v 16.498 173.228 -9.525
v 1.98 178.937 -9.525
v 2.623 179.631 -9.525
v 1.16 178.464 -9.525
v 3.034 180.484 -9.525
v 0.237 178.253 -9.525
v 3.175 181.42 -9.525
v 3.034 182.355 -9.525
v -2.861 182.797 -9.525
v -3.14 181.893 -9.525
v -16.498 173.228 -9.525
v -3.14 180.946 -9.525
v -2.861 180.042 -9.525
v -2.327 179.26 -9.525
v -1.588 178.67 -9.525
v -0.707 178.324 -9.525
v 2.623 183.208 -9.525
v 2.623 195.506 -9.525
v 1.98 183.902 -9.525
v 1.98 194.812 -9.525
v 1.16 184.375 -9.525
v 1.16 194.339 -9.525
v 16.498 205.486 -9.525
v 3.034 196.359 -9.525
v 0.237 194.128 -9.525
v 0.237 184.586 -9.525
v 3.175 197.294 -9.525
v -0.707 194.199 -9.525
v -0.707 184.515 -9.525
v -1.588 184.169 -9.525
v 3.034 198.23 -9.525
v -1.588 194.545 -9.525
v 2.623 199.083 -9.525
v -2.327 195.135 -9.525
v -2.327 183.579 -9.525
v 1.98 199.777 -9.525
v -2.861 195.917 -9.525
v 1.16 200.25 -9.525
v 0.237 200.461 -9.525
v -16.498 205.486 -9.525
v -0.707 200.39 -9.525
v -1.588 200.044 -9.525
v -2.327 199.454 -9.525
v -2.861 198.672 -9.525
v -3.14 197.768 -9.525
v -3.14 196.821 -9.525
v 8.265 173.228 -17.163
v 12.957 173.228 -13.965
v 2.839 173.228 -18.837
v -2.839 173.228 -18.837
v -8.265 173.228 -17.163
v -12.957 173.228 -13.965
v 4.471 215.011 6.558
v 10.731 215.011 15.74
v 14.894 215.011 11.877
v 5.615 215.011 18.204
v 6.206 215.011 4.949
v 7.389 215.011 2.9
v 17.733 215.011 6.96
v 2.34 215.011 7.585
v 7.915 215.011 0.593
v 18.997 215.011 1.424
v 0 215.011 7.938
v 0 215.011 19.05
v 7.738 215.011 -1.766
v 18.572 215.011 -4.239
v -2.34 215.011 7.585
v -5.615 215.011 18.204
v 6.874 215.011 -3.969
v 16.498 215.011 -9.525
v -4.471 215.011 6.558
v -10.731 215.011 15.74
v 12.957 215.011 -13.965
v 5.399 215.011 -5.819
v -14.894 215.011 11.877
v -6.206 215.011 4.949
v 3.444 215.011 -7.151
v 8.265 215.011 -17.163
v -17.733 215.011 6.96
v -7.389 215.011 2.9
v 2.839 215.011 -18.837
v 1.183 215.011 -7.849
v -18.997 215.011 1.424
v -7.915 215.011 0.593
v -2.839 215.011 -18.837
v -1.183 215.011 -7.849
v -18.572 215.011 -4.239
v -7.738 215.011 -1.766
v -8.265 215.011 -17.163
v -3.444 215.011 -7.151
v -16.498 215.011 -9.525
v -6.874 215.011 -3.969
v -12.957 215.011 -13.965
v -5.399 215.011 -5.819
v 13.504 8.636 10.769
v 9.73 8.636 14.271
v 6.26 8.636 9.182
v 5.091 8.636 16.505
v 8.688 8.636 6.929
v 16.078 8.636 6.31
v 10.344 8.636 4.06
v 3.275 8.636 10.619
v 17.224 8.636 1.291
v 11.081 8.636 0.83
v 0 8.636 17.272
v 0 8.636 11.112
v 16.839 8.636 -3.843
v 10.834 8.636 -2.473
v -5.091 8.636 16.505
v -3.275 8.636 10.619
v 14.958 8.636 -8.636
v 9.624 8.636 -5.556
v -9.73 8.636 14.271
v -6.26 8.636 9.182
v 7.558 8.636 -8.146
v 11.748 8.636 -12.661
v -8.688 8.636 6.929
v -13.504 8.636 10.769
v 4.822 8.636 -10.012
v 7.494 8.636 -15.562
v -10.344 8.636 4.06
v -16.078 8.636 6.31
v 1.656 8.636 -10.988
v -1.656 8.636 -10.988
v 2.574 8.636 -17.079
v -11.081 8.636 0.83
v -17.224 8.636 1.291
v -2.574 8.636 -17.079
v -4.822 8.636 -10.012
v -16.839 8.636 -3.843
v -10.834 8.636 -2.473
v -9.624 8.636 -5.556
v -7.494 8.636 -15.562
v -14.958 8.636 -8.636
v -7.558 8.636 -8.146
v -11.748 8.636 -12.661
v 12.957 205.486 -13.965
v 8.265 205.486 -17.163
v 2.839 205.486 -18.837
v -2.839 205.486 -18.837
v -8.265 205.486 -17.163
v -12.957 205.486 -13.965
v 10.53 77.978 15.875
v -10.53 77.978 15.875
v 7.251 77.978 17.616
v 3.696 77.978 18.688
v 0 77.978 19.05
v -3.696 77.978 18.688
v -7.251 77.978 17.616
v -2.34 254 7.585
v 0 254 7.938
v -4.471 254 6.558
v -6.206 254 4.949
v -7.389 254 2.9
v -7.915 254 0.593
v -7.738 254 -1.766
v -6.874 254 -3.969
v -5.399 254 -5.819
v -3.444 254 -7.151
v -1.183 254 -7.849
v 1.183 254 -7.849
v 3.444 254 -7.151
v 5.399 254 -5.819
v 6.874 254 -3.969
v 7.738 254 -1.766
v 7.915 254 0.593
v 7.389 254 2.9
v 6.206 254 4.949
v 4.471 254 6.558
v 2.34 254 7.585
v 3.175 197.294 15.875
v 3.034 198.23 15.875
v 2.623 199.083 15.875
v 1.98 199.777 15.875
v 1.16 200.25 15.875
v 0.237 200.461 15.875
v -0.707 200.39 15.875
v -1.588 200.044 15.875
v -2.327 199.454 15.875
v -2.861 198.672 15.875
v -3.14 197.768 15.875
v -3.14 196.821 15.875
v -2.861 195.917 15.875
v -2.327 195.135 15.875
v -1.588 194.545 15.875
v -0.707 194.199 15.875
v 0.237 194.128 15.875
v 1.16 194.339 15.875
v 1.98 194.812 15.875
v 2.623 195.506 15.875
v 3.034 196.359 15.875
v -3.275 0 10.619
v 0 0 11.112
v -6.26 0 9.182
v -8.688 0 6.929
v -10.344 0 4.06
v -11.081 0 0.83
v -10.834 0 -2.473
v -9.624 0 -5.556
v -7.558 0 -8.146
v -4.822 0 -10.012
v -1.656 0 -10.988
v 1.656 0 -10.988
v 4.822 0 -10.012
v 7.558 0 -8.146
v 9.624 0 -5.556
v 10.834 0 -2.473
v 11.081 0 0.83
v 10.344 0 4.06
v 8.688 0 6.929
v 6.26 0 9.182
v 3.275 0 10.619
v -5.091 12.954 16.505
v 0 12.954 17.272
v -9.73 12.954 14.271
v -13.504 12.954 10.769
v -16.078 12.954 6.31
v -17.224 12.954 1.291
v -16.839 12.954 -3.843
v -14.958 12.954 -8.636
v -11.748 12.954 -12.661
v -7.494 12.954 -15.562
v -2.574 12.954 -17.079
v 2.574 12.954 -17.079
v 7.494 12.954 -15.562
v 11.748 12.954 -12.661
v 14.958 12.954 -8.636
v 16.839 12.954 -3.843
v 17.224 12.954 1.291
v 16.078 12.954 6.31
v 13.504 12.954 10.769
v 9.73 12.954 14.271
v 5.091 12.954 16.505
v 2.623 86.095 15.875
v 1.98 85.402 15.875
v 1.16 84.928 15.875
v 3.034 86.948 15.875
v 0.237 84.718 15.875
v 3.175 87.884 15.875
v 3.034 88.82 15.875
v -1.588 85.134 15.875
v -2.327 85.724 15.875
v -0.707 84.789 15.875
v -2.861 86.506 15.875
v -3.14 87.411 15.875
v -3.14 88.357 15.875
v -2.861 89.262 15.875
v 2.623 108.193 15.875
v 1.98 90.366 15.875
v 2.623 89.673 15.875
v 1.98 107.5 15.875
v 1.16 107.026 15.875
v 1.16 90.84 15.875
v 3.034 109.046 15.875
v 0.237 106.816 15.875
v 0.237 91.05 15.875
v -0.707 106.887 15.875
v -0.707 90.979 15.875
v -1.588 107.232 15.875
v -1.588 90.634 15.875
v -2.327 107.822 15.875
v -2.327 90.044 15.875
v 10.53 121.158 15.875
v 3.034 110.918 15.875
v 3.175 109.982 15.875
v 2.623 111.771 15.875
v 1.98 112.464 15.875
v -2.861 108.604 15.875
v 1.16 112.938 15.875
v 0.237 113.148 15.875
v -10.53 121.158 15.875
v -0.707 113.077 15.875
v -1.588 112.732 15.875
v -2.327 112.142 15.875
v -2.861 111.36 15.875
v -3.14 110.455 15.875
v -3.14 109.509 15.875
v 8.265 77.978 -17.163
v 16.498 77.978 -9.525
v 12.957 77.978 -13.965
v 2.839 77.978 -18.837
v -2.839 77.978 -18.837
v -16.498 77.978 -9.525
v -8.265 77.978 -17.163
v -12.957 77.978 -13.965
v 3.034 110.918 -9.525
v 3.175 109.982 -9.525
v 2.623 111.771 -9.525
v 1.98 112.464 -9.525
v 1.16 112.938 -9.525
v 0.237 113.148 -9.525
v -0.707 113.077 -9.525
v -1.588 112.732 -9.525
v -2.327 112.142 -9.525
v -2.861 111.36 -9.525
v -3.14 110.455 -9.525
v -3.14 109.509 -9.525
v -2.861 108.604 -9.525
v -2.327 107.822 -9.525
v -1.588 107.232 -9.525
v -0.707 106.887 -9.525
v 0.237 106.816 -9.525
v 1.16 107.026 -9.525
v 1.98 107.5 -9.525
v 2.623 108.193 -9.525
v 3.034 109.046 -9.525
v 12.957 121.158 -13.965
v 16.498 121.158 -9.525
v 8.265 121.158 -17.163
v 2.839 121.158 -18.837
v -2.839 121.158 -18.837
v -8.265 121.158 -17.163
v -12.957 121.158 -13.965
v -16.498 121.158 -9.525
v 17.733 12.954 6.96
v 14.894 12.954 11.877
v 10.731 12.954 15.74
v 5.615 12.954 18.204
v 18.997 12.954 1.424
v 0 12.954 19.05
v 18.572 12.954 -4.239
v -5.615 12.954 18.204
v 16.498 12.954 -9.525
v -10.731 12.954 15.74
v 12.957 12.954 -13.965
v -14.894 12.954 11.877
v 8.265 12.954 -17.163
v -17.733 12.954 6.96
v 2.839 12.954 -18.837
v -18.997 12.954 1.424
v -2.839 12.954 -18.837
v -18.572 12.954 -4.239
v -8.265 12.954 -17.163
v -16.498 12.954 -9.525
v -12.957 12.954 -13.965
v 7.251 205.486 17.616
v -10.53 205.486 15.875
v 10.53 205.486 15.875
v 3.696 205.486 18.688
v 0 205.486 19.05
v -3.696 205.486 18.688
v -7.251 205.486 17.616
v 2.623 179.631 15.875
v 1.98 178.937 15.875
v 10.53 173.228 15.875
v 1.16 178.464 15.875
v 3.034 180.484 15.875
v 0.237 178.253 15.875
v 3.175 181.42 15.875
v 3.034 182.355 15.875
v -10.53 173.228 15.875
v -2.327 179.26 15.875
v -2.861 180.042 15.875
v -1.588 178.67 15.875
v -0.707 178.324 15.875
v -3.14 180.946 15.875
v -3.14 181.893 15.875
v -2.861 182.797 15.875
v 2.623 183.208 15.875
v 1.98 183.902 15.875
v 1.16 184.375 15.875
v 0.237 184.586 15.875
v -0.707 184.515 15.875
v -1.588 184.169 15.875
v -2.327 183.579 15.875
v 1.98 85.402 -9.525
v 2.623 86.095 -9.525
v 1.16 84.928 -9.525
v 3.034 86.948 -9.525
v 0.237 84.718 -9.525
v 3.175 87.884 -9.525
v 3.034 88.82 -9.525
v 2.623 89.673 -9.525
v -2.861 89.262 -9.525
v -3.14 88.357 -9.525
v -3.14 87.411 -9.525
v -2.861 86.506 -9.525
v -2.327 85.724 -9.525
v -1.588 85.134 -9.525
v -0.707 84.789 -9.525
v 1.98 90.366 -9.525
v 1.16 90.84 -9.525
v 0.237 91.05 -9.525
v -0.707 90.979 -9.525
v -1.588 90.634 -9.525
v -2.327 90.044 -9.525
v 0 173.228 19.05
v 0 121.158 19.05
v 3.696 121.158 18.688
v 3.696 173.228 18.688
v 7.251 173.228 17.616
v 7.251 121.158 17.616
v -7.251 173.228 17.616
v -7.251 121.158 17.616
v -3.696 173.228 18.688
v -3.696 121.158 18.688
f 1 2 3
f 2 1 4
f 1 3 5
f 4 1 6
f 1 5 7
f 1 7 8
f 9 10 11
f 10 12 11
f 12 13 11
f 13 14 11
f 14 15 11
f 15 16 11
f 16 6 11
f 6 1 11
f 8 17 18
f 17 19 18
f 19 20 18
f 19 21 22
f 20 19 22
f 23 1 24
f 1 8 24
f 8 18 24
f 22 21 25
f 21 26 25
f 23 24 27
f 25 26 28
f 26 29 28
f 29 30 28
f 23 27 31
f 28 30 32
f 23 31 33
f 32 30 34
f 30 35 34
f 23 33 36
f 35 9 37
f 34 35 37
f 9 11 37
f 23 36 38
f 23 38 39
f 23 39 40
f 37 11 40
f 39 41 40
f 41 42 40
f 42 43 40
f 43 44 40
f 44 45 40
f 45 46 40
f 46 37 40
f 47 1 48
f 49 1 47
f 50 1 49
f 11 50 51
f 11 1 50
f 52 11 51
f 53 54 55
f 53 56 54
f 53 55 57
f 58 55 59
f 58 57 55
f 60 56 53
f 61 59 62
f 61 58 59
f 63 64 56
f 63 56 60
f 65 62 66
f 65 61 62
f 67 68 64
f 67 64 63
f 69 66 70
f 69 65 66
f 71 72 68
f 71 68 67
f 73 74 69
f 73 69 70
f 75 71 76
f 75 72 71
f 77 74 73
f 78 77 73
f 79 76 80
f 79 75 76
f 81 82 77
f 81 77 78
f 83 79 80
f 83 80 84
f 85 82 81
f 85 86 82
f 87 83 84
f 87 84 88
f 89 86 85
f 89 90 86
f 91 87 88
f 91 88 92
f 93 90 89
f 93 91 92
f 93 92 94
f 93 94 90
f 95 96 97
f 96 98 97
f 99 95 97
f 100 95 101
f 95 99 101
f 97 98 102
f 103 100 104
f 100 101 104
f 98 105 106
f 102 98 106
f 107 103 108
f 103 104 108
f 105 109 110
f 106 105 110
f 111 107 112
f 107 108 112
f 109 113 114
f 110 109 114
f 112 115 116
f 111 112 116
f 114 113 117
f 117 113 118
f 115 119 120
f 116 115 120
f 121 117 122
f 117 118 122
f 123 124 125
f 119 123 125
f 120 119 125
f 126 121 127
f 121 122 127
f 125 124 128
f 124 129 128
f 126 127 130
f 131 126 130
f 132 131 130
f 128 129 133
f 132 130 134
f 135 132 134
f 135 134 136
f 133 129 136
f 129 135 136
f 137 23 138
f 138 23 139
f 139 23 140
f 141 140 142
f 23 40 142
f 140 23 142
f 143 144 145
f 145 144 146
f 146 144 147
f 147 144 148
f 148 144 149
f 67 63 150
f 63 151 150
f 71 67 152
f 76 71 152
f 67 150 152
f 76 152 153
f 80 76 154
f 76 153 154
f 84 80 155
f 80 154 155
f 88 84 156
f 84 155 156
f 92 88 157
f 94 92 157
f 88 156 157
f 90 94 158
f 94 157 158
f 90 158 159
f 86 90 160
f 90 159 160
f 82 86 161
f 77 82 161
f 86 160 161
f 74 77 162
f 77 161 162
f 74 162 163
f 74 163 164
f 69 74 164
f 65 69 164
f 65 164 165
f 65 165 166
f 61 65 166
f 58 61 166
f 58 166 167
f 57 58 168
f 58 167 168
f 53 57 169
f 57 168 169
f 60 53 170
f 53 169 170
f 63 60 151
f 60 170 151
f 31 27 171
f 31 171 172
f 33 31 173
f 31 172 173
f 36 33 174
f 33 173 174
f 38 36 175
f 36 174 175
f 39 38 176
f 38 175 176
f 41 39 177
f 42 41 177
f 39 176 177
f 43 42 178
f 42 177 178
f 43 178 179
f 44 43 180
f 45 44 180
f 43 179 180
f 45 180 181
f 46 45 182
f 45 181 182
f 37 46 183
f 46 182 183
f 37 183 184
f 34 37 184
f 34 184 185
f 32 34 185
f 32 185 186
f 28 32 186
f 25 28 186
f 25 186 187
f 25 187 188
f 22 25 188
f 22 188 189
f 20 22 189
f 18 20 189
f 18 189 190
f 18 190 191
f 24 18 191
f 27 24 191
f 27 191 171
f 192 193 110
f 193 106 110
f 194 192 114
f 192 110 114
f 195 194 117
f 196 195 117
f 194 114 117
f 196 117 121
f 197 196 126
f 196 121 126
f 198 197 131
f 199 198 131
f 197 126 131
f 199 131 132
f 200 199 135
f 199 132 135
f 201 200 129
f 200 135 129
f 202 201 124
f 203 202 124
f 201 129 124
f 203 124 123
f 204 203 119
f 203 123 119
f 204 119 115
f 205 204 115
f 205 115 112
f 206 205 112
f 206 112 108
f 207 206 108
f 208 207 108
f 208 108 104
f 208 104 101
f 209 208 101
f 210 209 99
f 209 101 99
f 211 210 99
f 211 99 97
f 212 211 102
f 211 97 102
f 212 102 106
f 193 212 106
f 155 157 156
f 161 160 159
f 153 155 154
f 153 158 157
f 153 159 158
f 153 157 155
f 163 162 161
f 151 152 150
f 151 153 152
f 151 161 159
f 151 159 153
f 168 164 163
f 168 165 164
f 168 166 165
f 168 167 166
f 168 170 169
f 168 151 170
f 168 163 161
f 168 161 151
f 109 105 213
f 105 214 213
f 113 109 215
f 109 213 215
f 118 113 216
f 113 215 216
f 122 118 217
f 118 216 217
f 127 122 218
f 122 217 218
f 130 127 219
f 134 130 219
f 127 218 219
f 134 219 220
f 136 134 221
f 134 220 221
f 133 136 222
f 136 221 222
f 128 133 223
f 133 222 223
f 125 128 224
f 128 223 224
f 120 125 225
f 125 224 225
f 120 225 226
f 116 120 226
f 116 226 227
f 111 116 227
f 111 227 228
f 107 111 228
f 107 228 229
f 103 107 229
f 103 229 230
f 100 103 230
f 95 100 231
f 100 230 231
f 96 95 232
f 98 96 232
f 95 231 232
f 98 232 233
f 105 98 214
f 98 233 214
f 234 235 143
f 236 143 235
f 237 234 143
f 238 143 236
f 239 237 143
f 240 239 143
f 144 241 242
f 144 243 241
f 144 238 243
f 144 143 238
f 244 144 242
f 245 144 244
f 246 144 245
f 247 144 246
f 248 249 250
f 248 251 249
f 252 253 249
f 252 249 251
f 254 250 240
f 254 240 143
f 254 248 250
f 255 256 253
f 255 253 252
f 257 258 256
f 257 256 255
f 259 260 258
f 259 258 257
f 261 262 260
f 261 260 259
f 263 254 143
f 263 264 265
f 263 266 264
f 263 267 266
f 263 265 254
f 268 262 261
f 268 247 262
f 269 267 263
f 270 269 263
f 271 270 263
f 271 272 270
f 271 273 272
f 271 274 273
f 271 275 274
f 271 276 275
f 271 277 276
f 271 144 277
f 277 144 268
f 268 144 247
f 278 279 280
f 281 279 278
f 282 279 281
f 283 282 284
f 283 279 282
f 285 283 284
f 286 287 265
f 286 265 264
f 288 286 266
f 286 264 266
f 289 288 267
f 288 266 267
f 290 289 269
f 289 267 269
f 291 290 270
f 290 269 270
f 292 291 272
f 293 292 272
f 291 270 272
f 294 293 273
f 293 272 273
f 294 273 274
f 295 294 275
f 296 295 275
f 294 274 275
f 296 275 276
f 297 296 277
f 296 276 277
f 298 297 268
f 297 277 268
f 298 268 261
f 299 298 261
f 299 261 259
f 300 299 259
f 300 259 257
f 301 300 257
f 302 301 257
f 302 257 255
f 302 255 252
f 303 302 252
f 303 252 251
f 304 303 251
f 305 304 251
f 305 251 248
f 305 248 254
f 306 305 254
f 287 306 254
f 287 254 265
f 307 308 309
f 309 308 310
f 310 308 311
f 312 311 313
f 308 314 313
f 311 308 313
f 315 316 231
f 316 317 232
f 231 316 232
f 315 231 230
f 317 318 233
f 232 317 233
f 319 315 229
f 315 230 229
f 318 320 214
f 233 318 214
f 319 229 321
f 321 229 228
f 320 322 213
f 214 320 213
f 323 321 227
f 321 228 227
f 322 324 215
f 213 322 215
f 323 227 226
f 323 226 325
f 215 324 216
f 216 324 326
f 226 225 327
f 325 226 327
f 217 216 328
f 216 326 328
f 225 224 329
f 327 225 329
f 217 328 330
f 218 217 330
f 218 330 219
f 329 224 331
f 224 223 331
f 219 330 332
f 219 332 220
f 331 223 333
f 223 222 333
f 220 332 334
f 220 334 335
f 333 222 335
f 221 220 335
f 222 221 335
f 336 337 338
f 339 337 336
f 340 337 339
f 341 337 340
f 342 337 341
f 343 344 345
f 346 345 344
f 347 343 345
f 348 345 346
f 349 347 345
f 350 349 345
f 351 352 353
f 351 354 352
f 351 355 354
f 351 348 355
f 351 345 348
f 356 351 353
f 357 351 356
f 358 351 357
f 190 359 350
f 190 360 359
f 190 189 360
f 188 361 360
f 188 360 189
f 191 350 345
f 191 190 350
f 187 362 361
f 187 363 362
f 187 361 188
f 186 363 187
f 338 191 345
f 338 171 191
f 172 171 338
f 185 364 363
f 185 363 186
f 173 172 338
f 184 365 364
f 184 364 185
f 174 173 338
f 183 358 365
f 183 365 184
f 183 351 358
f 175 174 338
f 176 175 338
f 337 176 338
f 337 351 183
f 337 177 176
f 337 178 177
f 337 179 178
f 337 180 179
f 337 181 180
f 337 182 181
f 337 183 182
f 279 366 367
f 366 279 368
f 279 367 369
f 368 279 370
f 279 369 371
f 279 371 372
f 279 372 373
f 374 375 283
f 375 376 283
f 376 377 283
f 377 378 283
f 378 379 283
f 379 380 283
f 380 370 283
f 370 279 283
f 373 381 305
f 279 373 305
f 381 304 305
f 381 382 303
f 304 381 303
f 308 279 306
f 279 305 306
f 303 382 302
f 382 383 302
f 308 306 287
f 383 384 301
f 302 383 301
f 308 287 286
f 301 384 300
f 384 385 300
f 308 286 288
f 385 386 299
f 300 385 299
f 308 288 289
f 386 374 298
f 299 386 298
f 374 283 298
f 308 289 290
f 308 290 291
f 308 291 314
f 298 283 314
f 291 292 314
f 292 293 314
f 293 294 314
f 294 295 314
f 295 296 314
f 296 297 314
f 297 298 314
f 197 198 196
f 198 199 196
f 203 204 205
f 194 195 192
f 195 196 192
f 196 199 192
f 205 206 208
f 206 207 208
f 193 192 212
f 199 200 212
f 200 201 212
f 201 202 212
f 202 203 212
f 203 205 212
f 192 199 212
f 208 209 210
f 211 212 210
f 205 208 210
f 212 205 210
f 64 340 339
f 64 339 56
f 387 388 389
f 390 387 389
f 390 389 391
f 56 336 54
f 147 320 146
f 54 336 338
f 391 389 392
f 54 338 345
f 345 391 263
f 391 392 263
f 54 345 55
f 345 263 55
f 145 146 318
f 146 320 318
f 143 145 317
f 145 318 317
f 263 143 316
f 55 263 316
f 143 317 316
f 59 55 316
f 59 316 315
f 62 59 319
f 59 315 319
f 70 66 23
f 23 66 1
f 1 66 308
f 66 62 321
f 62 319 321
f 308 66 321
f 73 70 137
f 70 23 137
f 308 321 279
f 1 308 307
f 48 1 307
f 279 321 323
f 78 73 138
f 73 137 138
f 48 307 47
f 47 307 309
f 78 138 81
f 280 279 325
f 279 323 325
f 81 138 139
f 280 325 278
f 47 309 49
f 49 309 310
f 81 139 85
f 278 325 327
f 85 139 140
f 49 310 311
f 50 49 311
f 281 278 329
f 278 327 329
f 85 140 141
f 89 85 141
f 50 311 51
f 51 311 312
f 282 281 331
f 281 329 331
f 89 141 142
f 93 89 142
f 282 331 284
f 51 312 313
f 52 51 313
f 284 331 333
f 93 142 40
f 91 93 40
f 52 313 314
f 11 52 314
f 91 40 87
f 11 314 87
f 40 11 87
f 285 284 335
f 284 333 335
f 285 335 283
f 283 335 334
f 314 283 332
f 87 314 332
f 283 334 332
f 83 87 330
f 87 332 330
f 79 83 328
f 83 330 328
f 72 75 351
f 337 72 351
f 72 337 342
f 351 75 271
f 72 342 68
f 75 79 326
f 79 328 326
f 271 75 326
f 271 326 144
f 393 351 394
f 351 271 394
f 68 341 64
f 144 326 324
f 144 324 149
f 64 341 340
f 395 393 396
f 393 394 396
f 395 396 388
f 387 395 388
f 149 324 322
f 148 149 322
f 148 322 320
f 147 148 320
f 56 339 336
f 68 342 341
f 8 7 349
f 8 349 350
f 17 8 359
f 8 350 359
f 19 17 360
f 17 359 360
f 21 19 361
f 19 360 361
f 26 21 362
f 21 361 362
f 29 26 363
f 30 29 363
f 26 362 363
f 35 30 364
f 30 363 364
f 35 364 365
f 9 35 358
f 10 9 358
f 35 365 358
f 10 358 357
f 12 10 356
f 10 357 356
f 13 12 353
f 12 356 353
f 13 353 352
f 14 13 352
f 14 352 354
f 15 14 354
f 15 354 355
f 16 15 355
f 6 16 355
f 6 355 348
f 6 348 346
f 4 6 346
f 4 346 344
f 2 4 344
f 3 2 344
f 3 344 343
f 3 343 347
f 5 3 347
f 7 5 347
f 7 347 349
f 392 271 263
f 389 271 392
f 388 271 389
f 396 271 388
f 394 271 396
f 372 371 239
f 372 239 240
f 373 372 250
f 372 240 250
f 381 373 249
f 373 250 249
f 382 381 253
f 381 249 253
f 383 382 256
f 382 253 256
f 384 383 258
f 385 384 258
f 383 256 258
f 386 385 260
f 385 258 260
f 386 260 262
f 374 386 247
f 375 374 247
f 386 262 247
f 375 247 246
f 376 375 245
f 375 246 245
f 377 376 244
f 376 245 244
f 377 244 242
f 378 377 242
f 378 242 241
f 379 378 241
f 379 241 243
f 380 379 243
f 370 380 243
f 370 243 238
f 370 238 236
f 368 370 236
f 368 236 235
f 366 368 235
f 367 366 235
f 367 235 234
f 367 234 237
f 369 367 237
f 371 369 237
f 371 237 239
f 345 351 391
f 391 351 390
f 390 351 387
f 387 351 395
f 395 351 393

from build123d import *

# Parameters (mm, degrees)
SKETCH1_R               = 19.05
BOSS_EXTRUDE1_DEPTH     = 254
SKETCH2_W               = 11.1125
SKETCH2_H               = 38.989
CUT_EXTRUDE1_DEPTH      = 256.424754086
CUT_EXTRUDE1_DEPTH_BACK = 256.424754086
SKETCH3_W               = 9.525
SKETCH3_H               = 32.258
SKETCH3_H_2             = 43.18
SKETCH3_W_2             = 3.175
F_1_1_DIAMETER_HOLE1_D  = 6.35


with BuildPart() as part:
    # Sketch1 → Boss-Extrude1 (new body)
    with BuildSketch(Plane(origin=(0, 0, 0), x_dir=(1, 0, 0), z_dir=(0, 1, 0))):
        with Locations(Location((0, 0, 0), (0, 0, 270))):
            Circle(SKETCH1_R)
    extrude(amount=BOSS_EXTRUDE1_DEPTH)

    # Sketch2 → Cut-Revolve1 (revolve, cut)
    with BuildSketch(Plane.XY, mode=Mode.PRIVATE) as cut_revolve1_sk:
        Polygon((19.05, 0), (11.1125, 0), (11.1125, 8.636), (17.272, 8.636), (17.272, 12.954), (19.05, 12.954), align=None)
        with Locations((13.49375, 234.5055)):
            Rectangle(SKETCH2_W, SKETCH2_H)
    revolve(cut_revolve1_sk.sketch.rotate(Axis((0, 348.337253792, 0), (0, -1, 0)), 90), axis=Axis((0, 348.337253792, 0), (0, -1, 0)), mode=Mode.SUBTRACT)

    # Sketch3 → Cut-Extrude1 (cut, two sides: drawn at the far end of the back side and taken through both)
    with BuildSketch(Plane(origin=(0, 0, 0), x_dir=(0, 0, -1), z_dir=(1, 0, 0)).offset(-CUT_EXTRUDE1_DEPTH_BACK)):
        with Locations((14.2875, 189.357)):
            Rectangle(SKETCH3_W, SKETCH3_H)
        with Locations((14.2875, 99.568)):
            Rectangle(SKETCH3_W, SKETCH3_H_2)
        with Locations((-17.4625, 189.357)):
            Rectangle(SKETCH3_W_2, SKETCH3_H)
        with Locations((-17.4625, 99.568)):
            Rectangle(SKETCH3_W_2, SKETCH3_H_2)
    extrude(amount=CUT_EXTRUDE1_DEPTH + CUT_EXTRUDE1_DEPTH_BACK, mode=Mode.SUBTRACT)

    # 1 (1) Diameter Hole1 (through all)
    with Locations(Plane(origin=(0, 0, -9.525), x_dir=(-1, 0, 0), z_dir=(0, 0, -1))):
        with Locations((0, 197.2945), (0, 181.4195), (0, 109.982), (0, 87.884)):
            Hole(F_1_1_DIAMETER_HOLE1_D / 2)


solid = part.part
